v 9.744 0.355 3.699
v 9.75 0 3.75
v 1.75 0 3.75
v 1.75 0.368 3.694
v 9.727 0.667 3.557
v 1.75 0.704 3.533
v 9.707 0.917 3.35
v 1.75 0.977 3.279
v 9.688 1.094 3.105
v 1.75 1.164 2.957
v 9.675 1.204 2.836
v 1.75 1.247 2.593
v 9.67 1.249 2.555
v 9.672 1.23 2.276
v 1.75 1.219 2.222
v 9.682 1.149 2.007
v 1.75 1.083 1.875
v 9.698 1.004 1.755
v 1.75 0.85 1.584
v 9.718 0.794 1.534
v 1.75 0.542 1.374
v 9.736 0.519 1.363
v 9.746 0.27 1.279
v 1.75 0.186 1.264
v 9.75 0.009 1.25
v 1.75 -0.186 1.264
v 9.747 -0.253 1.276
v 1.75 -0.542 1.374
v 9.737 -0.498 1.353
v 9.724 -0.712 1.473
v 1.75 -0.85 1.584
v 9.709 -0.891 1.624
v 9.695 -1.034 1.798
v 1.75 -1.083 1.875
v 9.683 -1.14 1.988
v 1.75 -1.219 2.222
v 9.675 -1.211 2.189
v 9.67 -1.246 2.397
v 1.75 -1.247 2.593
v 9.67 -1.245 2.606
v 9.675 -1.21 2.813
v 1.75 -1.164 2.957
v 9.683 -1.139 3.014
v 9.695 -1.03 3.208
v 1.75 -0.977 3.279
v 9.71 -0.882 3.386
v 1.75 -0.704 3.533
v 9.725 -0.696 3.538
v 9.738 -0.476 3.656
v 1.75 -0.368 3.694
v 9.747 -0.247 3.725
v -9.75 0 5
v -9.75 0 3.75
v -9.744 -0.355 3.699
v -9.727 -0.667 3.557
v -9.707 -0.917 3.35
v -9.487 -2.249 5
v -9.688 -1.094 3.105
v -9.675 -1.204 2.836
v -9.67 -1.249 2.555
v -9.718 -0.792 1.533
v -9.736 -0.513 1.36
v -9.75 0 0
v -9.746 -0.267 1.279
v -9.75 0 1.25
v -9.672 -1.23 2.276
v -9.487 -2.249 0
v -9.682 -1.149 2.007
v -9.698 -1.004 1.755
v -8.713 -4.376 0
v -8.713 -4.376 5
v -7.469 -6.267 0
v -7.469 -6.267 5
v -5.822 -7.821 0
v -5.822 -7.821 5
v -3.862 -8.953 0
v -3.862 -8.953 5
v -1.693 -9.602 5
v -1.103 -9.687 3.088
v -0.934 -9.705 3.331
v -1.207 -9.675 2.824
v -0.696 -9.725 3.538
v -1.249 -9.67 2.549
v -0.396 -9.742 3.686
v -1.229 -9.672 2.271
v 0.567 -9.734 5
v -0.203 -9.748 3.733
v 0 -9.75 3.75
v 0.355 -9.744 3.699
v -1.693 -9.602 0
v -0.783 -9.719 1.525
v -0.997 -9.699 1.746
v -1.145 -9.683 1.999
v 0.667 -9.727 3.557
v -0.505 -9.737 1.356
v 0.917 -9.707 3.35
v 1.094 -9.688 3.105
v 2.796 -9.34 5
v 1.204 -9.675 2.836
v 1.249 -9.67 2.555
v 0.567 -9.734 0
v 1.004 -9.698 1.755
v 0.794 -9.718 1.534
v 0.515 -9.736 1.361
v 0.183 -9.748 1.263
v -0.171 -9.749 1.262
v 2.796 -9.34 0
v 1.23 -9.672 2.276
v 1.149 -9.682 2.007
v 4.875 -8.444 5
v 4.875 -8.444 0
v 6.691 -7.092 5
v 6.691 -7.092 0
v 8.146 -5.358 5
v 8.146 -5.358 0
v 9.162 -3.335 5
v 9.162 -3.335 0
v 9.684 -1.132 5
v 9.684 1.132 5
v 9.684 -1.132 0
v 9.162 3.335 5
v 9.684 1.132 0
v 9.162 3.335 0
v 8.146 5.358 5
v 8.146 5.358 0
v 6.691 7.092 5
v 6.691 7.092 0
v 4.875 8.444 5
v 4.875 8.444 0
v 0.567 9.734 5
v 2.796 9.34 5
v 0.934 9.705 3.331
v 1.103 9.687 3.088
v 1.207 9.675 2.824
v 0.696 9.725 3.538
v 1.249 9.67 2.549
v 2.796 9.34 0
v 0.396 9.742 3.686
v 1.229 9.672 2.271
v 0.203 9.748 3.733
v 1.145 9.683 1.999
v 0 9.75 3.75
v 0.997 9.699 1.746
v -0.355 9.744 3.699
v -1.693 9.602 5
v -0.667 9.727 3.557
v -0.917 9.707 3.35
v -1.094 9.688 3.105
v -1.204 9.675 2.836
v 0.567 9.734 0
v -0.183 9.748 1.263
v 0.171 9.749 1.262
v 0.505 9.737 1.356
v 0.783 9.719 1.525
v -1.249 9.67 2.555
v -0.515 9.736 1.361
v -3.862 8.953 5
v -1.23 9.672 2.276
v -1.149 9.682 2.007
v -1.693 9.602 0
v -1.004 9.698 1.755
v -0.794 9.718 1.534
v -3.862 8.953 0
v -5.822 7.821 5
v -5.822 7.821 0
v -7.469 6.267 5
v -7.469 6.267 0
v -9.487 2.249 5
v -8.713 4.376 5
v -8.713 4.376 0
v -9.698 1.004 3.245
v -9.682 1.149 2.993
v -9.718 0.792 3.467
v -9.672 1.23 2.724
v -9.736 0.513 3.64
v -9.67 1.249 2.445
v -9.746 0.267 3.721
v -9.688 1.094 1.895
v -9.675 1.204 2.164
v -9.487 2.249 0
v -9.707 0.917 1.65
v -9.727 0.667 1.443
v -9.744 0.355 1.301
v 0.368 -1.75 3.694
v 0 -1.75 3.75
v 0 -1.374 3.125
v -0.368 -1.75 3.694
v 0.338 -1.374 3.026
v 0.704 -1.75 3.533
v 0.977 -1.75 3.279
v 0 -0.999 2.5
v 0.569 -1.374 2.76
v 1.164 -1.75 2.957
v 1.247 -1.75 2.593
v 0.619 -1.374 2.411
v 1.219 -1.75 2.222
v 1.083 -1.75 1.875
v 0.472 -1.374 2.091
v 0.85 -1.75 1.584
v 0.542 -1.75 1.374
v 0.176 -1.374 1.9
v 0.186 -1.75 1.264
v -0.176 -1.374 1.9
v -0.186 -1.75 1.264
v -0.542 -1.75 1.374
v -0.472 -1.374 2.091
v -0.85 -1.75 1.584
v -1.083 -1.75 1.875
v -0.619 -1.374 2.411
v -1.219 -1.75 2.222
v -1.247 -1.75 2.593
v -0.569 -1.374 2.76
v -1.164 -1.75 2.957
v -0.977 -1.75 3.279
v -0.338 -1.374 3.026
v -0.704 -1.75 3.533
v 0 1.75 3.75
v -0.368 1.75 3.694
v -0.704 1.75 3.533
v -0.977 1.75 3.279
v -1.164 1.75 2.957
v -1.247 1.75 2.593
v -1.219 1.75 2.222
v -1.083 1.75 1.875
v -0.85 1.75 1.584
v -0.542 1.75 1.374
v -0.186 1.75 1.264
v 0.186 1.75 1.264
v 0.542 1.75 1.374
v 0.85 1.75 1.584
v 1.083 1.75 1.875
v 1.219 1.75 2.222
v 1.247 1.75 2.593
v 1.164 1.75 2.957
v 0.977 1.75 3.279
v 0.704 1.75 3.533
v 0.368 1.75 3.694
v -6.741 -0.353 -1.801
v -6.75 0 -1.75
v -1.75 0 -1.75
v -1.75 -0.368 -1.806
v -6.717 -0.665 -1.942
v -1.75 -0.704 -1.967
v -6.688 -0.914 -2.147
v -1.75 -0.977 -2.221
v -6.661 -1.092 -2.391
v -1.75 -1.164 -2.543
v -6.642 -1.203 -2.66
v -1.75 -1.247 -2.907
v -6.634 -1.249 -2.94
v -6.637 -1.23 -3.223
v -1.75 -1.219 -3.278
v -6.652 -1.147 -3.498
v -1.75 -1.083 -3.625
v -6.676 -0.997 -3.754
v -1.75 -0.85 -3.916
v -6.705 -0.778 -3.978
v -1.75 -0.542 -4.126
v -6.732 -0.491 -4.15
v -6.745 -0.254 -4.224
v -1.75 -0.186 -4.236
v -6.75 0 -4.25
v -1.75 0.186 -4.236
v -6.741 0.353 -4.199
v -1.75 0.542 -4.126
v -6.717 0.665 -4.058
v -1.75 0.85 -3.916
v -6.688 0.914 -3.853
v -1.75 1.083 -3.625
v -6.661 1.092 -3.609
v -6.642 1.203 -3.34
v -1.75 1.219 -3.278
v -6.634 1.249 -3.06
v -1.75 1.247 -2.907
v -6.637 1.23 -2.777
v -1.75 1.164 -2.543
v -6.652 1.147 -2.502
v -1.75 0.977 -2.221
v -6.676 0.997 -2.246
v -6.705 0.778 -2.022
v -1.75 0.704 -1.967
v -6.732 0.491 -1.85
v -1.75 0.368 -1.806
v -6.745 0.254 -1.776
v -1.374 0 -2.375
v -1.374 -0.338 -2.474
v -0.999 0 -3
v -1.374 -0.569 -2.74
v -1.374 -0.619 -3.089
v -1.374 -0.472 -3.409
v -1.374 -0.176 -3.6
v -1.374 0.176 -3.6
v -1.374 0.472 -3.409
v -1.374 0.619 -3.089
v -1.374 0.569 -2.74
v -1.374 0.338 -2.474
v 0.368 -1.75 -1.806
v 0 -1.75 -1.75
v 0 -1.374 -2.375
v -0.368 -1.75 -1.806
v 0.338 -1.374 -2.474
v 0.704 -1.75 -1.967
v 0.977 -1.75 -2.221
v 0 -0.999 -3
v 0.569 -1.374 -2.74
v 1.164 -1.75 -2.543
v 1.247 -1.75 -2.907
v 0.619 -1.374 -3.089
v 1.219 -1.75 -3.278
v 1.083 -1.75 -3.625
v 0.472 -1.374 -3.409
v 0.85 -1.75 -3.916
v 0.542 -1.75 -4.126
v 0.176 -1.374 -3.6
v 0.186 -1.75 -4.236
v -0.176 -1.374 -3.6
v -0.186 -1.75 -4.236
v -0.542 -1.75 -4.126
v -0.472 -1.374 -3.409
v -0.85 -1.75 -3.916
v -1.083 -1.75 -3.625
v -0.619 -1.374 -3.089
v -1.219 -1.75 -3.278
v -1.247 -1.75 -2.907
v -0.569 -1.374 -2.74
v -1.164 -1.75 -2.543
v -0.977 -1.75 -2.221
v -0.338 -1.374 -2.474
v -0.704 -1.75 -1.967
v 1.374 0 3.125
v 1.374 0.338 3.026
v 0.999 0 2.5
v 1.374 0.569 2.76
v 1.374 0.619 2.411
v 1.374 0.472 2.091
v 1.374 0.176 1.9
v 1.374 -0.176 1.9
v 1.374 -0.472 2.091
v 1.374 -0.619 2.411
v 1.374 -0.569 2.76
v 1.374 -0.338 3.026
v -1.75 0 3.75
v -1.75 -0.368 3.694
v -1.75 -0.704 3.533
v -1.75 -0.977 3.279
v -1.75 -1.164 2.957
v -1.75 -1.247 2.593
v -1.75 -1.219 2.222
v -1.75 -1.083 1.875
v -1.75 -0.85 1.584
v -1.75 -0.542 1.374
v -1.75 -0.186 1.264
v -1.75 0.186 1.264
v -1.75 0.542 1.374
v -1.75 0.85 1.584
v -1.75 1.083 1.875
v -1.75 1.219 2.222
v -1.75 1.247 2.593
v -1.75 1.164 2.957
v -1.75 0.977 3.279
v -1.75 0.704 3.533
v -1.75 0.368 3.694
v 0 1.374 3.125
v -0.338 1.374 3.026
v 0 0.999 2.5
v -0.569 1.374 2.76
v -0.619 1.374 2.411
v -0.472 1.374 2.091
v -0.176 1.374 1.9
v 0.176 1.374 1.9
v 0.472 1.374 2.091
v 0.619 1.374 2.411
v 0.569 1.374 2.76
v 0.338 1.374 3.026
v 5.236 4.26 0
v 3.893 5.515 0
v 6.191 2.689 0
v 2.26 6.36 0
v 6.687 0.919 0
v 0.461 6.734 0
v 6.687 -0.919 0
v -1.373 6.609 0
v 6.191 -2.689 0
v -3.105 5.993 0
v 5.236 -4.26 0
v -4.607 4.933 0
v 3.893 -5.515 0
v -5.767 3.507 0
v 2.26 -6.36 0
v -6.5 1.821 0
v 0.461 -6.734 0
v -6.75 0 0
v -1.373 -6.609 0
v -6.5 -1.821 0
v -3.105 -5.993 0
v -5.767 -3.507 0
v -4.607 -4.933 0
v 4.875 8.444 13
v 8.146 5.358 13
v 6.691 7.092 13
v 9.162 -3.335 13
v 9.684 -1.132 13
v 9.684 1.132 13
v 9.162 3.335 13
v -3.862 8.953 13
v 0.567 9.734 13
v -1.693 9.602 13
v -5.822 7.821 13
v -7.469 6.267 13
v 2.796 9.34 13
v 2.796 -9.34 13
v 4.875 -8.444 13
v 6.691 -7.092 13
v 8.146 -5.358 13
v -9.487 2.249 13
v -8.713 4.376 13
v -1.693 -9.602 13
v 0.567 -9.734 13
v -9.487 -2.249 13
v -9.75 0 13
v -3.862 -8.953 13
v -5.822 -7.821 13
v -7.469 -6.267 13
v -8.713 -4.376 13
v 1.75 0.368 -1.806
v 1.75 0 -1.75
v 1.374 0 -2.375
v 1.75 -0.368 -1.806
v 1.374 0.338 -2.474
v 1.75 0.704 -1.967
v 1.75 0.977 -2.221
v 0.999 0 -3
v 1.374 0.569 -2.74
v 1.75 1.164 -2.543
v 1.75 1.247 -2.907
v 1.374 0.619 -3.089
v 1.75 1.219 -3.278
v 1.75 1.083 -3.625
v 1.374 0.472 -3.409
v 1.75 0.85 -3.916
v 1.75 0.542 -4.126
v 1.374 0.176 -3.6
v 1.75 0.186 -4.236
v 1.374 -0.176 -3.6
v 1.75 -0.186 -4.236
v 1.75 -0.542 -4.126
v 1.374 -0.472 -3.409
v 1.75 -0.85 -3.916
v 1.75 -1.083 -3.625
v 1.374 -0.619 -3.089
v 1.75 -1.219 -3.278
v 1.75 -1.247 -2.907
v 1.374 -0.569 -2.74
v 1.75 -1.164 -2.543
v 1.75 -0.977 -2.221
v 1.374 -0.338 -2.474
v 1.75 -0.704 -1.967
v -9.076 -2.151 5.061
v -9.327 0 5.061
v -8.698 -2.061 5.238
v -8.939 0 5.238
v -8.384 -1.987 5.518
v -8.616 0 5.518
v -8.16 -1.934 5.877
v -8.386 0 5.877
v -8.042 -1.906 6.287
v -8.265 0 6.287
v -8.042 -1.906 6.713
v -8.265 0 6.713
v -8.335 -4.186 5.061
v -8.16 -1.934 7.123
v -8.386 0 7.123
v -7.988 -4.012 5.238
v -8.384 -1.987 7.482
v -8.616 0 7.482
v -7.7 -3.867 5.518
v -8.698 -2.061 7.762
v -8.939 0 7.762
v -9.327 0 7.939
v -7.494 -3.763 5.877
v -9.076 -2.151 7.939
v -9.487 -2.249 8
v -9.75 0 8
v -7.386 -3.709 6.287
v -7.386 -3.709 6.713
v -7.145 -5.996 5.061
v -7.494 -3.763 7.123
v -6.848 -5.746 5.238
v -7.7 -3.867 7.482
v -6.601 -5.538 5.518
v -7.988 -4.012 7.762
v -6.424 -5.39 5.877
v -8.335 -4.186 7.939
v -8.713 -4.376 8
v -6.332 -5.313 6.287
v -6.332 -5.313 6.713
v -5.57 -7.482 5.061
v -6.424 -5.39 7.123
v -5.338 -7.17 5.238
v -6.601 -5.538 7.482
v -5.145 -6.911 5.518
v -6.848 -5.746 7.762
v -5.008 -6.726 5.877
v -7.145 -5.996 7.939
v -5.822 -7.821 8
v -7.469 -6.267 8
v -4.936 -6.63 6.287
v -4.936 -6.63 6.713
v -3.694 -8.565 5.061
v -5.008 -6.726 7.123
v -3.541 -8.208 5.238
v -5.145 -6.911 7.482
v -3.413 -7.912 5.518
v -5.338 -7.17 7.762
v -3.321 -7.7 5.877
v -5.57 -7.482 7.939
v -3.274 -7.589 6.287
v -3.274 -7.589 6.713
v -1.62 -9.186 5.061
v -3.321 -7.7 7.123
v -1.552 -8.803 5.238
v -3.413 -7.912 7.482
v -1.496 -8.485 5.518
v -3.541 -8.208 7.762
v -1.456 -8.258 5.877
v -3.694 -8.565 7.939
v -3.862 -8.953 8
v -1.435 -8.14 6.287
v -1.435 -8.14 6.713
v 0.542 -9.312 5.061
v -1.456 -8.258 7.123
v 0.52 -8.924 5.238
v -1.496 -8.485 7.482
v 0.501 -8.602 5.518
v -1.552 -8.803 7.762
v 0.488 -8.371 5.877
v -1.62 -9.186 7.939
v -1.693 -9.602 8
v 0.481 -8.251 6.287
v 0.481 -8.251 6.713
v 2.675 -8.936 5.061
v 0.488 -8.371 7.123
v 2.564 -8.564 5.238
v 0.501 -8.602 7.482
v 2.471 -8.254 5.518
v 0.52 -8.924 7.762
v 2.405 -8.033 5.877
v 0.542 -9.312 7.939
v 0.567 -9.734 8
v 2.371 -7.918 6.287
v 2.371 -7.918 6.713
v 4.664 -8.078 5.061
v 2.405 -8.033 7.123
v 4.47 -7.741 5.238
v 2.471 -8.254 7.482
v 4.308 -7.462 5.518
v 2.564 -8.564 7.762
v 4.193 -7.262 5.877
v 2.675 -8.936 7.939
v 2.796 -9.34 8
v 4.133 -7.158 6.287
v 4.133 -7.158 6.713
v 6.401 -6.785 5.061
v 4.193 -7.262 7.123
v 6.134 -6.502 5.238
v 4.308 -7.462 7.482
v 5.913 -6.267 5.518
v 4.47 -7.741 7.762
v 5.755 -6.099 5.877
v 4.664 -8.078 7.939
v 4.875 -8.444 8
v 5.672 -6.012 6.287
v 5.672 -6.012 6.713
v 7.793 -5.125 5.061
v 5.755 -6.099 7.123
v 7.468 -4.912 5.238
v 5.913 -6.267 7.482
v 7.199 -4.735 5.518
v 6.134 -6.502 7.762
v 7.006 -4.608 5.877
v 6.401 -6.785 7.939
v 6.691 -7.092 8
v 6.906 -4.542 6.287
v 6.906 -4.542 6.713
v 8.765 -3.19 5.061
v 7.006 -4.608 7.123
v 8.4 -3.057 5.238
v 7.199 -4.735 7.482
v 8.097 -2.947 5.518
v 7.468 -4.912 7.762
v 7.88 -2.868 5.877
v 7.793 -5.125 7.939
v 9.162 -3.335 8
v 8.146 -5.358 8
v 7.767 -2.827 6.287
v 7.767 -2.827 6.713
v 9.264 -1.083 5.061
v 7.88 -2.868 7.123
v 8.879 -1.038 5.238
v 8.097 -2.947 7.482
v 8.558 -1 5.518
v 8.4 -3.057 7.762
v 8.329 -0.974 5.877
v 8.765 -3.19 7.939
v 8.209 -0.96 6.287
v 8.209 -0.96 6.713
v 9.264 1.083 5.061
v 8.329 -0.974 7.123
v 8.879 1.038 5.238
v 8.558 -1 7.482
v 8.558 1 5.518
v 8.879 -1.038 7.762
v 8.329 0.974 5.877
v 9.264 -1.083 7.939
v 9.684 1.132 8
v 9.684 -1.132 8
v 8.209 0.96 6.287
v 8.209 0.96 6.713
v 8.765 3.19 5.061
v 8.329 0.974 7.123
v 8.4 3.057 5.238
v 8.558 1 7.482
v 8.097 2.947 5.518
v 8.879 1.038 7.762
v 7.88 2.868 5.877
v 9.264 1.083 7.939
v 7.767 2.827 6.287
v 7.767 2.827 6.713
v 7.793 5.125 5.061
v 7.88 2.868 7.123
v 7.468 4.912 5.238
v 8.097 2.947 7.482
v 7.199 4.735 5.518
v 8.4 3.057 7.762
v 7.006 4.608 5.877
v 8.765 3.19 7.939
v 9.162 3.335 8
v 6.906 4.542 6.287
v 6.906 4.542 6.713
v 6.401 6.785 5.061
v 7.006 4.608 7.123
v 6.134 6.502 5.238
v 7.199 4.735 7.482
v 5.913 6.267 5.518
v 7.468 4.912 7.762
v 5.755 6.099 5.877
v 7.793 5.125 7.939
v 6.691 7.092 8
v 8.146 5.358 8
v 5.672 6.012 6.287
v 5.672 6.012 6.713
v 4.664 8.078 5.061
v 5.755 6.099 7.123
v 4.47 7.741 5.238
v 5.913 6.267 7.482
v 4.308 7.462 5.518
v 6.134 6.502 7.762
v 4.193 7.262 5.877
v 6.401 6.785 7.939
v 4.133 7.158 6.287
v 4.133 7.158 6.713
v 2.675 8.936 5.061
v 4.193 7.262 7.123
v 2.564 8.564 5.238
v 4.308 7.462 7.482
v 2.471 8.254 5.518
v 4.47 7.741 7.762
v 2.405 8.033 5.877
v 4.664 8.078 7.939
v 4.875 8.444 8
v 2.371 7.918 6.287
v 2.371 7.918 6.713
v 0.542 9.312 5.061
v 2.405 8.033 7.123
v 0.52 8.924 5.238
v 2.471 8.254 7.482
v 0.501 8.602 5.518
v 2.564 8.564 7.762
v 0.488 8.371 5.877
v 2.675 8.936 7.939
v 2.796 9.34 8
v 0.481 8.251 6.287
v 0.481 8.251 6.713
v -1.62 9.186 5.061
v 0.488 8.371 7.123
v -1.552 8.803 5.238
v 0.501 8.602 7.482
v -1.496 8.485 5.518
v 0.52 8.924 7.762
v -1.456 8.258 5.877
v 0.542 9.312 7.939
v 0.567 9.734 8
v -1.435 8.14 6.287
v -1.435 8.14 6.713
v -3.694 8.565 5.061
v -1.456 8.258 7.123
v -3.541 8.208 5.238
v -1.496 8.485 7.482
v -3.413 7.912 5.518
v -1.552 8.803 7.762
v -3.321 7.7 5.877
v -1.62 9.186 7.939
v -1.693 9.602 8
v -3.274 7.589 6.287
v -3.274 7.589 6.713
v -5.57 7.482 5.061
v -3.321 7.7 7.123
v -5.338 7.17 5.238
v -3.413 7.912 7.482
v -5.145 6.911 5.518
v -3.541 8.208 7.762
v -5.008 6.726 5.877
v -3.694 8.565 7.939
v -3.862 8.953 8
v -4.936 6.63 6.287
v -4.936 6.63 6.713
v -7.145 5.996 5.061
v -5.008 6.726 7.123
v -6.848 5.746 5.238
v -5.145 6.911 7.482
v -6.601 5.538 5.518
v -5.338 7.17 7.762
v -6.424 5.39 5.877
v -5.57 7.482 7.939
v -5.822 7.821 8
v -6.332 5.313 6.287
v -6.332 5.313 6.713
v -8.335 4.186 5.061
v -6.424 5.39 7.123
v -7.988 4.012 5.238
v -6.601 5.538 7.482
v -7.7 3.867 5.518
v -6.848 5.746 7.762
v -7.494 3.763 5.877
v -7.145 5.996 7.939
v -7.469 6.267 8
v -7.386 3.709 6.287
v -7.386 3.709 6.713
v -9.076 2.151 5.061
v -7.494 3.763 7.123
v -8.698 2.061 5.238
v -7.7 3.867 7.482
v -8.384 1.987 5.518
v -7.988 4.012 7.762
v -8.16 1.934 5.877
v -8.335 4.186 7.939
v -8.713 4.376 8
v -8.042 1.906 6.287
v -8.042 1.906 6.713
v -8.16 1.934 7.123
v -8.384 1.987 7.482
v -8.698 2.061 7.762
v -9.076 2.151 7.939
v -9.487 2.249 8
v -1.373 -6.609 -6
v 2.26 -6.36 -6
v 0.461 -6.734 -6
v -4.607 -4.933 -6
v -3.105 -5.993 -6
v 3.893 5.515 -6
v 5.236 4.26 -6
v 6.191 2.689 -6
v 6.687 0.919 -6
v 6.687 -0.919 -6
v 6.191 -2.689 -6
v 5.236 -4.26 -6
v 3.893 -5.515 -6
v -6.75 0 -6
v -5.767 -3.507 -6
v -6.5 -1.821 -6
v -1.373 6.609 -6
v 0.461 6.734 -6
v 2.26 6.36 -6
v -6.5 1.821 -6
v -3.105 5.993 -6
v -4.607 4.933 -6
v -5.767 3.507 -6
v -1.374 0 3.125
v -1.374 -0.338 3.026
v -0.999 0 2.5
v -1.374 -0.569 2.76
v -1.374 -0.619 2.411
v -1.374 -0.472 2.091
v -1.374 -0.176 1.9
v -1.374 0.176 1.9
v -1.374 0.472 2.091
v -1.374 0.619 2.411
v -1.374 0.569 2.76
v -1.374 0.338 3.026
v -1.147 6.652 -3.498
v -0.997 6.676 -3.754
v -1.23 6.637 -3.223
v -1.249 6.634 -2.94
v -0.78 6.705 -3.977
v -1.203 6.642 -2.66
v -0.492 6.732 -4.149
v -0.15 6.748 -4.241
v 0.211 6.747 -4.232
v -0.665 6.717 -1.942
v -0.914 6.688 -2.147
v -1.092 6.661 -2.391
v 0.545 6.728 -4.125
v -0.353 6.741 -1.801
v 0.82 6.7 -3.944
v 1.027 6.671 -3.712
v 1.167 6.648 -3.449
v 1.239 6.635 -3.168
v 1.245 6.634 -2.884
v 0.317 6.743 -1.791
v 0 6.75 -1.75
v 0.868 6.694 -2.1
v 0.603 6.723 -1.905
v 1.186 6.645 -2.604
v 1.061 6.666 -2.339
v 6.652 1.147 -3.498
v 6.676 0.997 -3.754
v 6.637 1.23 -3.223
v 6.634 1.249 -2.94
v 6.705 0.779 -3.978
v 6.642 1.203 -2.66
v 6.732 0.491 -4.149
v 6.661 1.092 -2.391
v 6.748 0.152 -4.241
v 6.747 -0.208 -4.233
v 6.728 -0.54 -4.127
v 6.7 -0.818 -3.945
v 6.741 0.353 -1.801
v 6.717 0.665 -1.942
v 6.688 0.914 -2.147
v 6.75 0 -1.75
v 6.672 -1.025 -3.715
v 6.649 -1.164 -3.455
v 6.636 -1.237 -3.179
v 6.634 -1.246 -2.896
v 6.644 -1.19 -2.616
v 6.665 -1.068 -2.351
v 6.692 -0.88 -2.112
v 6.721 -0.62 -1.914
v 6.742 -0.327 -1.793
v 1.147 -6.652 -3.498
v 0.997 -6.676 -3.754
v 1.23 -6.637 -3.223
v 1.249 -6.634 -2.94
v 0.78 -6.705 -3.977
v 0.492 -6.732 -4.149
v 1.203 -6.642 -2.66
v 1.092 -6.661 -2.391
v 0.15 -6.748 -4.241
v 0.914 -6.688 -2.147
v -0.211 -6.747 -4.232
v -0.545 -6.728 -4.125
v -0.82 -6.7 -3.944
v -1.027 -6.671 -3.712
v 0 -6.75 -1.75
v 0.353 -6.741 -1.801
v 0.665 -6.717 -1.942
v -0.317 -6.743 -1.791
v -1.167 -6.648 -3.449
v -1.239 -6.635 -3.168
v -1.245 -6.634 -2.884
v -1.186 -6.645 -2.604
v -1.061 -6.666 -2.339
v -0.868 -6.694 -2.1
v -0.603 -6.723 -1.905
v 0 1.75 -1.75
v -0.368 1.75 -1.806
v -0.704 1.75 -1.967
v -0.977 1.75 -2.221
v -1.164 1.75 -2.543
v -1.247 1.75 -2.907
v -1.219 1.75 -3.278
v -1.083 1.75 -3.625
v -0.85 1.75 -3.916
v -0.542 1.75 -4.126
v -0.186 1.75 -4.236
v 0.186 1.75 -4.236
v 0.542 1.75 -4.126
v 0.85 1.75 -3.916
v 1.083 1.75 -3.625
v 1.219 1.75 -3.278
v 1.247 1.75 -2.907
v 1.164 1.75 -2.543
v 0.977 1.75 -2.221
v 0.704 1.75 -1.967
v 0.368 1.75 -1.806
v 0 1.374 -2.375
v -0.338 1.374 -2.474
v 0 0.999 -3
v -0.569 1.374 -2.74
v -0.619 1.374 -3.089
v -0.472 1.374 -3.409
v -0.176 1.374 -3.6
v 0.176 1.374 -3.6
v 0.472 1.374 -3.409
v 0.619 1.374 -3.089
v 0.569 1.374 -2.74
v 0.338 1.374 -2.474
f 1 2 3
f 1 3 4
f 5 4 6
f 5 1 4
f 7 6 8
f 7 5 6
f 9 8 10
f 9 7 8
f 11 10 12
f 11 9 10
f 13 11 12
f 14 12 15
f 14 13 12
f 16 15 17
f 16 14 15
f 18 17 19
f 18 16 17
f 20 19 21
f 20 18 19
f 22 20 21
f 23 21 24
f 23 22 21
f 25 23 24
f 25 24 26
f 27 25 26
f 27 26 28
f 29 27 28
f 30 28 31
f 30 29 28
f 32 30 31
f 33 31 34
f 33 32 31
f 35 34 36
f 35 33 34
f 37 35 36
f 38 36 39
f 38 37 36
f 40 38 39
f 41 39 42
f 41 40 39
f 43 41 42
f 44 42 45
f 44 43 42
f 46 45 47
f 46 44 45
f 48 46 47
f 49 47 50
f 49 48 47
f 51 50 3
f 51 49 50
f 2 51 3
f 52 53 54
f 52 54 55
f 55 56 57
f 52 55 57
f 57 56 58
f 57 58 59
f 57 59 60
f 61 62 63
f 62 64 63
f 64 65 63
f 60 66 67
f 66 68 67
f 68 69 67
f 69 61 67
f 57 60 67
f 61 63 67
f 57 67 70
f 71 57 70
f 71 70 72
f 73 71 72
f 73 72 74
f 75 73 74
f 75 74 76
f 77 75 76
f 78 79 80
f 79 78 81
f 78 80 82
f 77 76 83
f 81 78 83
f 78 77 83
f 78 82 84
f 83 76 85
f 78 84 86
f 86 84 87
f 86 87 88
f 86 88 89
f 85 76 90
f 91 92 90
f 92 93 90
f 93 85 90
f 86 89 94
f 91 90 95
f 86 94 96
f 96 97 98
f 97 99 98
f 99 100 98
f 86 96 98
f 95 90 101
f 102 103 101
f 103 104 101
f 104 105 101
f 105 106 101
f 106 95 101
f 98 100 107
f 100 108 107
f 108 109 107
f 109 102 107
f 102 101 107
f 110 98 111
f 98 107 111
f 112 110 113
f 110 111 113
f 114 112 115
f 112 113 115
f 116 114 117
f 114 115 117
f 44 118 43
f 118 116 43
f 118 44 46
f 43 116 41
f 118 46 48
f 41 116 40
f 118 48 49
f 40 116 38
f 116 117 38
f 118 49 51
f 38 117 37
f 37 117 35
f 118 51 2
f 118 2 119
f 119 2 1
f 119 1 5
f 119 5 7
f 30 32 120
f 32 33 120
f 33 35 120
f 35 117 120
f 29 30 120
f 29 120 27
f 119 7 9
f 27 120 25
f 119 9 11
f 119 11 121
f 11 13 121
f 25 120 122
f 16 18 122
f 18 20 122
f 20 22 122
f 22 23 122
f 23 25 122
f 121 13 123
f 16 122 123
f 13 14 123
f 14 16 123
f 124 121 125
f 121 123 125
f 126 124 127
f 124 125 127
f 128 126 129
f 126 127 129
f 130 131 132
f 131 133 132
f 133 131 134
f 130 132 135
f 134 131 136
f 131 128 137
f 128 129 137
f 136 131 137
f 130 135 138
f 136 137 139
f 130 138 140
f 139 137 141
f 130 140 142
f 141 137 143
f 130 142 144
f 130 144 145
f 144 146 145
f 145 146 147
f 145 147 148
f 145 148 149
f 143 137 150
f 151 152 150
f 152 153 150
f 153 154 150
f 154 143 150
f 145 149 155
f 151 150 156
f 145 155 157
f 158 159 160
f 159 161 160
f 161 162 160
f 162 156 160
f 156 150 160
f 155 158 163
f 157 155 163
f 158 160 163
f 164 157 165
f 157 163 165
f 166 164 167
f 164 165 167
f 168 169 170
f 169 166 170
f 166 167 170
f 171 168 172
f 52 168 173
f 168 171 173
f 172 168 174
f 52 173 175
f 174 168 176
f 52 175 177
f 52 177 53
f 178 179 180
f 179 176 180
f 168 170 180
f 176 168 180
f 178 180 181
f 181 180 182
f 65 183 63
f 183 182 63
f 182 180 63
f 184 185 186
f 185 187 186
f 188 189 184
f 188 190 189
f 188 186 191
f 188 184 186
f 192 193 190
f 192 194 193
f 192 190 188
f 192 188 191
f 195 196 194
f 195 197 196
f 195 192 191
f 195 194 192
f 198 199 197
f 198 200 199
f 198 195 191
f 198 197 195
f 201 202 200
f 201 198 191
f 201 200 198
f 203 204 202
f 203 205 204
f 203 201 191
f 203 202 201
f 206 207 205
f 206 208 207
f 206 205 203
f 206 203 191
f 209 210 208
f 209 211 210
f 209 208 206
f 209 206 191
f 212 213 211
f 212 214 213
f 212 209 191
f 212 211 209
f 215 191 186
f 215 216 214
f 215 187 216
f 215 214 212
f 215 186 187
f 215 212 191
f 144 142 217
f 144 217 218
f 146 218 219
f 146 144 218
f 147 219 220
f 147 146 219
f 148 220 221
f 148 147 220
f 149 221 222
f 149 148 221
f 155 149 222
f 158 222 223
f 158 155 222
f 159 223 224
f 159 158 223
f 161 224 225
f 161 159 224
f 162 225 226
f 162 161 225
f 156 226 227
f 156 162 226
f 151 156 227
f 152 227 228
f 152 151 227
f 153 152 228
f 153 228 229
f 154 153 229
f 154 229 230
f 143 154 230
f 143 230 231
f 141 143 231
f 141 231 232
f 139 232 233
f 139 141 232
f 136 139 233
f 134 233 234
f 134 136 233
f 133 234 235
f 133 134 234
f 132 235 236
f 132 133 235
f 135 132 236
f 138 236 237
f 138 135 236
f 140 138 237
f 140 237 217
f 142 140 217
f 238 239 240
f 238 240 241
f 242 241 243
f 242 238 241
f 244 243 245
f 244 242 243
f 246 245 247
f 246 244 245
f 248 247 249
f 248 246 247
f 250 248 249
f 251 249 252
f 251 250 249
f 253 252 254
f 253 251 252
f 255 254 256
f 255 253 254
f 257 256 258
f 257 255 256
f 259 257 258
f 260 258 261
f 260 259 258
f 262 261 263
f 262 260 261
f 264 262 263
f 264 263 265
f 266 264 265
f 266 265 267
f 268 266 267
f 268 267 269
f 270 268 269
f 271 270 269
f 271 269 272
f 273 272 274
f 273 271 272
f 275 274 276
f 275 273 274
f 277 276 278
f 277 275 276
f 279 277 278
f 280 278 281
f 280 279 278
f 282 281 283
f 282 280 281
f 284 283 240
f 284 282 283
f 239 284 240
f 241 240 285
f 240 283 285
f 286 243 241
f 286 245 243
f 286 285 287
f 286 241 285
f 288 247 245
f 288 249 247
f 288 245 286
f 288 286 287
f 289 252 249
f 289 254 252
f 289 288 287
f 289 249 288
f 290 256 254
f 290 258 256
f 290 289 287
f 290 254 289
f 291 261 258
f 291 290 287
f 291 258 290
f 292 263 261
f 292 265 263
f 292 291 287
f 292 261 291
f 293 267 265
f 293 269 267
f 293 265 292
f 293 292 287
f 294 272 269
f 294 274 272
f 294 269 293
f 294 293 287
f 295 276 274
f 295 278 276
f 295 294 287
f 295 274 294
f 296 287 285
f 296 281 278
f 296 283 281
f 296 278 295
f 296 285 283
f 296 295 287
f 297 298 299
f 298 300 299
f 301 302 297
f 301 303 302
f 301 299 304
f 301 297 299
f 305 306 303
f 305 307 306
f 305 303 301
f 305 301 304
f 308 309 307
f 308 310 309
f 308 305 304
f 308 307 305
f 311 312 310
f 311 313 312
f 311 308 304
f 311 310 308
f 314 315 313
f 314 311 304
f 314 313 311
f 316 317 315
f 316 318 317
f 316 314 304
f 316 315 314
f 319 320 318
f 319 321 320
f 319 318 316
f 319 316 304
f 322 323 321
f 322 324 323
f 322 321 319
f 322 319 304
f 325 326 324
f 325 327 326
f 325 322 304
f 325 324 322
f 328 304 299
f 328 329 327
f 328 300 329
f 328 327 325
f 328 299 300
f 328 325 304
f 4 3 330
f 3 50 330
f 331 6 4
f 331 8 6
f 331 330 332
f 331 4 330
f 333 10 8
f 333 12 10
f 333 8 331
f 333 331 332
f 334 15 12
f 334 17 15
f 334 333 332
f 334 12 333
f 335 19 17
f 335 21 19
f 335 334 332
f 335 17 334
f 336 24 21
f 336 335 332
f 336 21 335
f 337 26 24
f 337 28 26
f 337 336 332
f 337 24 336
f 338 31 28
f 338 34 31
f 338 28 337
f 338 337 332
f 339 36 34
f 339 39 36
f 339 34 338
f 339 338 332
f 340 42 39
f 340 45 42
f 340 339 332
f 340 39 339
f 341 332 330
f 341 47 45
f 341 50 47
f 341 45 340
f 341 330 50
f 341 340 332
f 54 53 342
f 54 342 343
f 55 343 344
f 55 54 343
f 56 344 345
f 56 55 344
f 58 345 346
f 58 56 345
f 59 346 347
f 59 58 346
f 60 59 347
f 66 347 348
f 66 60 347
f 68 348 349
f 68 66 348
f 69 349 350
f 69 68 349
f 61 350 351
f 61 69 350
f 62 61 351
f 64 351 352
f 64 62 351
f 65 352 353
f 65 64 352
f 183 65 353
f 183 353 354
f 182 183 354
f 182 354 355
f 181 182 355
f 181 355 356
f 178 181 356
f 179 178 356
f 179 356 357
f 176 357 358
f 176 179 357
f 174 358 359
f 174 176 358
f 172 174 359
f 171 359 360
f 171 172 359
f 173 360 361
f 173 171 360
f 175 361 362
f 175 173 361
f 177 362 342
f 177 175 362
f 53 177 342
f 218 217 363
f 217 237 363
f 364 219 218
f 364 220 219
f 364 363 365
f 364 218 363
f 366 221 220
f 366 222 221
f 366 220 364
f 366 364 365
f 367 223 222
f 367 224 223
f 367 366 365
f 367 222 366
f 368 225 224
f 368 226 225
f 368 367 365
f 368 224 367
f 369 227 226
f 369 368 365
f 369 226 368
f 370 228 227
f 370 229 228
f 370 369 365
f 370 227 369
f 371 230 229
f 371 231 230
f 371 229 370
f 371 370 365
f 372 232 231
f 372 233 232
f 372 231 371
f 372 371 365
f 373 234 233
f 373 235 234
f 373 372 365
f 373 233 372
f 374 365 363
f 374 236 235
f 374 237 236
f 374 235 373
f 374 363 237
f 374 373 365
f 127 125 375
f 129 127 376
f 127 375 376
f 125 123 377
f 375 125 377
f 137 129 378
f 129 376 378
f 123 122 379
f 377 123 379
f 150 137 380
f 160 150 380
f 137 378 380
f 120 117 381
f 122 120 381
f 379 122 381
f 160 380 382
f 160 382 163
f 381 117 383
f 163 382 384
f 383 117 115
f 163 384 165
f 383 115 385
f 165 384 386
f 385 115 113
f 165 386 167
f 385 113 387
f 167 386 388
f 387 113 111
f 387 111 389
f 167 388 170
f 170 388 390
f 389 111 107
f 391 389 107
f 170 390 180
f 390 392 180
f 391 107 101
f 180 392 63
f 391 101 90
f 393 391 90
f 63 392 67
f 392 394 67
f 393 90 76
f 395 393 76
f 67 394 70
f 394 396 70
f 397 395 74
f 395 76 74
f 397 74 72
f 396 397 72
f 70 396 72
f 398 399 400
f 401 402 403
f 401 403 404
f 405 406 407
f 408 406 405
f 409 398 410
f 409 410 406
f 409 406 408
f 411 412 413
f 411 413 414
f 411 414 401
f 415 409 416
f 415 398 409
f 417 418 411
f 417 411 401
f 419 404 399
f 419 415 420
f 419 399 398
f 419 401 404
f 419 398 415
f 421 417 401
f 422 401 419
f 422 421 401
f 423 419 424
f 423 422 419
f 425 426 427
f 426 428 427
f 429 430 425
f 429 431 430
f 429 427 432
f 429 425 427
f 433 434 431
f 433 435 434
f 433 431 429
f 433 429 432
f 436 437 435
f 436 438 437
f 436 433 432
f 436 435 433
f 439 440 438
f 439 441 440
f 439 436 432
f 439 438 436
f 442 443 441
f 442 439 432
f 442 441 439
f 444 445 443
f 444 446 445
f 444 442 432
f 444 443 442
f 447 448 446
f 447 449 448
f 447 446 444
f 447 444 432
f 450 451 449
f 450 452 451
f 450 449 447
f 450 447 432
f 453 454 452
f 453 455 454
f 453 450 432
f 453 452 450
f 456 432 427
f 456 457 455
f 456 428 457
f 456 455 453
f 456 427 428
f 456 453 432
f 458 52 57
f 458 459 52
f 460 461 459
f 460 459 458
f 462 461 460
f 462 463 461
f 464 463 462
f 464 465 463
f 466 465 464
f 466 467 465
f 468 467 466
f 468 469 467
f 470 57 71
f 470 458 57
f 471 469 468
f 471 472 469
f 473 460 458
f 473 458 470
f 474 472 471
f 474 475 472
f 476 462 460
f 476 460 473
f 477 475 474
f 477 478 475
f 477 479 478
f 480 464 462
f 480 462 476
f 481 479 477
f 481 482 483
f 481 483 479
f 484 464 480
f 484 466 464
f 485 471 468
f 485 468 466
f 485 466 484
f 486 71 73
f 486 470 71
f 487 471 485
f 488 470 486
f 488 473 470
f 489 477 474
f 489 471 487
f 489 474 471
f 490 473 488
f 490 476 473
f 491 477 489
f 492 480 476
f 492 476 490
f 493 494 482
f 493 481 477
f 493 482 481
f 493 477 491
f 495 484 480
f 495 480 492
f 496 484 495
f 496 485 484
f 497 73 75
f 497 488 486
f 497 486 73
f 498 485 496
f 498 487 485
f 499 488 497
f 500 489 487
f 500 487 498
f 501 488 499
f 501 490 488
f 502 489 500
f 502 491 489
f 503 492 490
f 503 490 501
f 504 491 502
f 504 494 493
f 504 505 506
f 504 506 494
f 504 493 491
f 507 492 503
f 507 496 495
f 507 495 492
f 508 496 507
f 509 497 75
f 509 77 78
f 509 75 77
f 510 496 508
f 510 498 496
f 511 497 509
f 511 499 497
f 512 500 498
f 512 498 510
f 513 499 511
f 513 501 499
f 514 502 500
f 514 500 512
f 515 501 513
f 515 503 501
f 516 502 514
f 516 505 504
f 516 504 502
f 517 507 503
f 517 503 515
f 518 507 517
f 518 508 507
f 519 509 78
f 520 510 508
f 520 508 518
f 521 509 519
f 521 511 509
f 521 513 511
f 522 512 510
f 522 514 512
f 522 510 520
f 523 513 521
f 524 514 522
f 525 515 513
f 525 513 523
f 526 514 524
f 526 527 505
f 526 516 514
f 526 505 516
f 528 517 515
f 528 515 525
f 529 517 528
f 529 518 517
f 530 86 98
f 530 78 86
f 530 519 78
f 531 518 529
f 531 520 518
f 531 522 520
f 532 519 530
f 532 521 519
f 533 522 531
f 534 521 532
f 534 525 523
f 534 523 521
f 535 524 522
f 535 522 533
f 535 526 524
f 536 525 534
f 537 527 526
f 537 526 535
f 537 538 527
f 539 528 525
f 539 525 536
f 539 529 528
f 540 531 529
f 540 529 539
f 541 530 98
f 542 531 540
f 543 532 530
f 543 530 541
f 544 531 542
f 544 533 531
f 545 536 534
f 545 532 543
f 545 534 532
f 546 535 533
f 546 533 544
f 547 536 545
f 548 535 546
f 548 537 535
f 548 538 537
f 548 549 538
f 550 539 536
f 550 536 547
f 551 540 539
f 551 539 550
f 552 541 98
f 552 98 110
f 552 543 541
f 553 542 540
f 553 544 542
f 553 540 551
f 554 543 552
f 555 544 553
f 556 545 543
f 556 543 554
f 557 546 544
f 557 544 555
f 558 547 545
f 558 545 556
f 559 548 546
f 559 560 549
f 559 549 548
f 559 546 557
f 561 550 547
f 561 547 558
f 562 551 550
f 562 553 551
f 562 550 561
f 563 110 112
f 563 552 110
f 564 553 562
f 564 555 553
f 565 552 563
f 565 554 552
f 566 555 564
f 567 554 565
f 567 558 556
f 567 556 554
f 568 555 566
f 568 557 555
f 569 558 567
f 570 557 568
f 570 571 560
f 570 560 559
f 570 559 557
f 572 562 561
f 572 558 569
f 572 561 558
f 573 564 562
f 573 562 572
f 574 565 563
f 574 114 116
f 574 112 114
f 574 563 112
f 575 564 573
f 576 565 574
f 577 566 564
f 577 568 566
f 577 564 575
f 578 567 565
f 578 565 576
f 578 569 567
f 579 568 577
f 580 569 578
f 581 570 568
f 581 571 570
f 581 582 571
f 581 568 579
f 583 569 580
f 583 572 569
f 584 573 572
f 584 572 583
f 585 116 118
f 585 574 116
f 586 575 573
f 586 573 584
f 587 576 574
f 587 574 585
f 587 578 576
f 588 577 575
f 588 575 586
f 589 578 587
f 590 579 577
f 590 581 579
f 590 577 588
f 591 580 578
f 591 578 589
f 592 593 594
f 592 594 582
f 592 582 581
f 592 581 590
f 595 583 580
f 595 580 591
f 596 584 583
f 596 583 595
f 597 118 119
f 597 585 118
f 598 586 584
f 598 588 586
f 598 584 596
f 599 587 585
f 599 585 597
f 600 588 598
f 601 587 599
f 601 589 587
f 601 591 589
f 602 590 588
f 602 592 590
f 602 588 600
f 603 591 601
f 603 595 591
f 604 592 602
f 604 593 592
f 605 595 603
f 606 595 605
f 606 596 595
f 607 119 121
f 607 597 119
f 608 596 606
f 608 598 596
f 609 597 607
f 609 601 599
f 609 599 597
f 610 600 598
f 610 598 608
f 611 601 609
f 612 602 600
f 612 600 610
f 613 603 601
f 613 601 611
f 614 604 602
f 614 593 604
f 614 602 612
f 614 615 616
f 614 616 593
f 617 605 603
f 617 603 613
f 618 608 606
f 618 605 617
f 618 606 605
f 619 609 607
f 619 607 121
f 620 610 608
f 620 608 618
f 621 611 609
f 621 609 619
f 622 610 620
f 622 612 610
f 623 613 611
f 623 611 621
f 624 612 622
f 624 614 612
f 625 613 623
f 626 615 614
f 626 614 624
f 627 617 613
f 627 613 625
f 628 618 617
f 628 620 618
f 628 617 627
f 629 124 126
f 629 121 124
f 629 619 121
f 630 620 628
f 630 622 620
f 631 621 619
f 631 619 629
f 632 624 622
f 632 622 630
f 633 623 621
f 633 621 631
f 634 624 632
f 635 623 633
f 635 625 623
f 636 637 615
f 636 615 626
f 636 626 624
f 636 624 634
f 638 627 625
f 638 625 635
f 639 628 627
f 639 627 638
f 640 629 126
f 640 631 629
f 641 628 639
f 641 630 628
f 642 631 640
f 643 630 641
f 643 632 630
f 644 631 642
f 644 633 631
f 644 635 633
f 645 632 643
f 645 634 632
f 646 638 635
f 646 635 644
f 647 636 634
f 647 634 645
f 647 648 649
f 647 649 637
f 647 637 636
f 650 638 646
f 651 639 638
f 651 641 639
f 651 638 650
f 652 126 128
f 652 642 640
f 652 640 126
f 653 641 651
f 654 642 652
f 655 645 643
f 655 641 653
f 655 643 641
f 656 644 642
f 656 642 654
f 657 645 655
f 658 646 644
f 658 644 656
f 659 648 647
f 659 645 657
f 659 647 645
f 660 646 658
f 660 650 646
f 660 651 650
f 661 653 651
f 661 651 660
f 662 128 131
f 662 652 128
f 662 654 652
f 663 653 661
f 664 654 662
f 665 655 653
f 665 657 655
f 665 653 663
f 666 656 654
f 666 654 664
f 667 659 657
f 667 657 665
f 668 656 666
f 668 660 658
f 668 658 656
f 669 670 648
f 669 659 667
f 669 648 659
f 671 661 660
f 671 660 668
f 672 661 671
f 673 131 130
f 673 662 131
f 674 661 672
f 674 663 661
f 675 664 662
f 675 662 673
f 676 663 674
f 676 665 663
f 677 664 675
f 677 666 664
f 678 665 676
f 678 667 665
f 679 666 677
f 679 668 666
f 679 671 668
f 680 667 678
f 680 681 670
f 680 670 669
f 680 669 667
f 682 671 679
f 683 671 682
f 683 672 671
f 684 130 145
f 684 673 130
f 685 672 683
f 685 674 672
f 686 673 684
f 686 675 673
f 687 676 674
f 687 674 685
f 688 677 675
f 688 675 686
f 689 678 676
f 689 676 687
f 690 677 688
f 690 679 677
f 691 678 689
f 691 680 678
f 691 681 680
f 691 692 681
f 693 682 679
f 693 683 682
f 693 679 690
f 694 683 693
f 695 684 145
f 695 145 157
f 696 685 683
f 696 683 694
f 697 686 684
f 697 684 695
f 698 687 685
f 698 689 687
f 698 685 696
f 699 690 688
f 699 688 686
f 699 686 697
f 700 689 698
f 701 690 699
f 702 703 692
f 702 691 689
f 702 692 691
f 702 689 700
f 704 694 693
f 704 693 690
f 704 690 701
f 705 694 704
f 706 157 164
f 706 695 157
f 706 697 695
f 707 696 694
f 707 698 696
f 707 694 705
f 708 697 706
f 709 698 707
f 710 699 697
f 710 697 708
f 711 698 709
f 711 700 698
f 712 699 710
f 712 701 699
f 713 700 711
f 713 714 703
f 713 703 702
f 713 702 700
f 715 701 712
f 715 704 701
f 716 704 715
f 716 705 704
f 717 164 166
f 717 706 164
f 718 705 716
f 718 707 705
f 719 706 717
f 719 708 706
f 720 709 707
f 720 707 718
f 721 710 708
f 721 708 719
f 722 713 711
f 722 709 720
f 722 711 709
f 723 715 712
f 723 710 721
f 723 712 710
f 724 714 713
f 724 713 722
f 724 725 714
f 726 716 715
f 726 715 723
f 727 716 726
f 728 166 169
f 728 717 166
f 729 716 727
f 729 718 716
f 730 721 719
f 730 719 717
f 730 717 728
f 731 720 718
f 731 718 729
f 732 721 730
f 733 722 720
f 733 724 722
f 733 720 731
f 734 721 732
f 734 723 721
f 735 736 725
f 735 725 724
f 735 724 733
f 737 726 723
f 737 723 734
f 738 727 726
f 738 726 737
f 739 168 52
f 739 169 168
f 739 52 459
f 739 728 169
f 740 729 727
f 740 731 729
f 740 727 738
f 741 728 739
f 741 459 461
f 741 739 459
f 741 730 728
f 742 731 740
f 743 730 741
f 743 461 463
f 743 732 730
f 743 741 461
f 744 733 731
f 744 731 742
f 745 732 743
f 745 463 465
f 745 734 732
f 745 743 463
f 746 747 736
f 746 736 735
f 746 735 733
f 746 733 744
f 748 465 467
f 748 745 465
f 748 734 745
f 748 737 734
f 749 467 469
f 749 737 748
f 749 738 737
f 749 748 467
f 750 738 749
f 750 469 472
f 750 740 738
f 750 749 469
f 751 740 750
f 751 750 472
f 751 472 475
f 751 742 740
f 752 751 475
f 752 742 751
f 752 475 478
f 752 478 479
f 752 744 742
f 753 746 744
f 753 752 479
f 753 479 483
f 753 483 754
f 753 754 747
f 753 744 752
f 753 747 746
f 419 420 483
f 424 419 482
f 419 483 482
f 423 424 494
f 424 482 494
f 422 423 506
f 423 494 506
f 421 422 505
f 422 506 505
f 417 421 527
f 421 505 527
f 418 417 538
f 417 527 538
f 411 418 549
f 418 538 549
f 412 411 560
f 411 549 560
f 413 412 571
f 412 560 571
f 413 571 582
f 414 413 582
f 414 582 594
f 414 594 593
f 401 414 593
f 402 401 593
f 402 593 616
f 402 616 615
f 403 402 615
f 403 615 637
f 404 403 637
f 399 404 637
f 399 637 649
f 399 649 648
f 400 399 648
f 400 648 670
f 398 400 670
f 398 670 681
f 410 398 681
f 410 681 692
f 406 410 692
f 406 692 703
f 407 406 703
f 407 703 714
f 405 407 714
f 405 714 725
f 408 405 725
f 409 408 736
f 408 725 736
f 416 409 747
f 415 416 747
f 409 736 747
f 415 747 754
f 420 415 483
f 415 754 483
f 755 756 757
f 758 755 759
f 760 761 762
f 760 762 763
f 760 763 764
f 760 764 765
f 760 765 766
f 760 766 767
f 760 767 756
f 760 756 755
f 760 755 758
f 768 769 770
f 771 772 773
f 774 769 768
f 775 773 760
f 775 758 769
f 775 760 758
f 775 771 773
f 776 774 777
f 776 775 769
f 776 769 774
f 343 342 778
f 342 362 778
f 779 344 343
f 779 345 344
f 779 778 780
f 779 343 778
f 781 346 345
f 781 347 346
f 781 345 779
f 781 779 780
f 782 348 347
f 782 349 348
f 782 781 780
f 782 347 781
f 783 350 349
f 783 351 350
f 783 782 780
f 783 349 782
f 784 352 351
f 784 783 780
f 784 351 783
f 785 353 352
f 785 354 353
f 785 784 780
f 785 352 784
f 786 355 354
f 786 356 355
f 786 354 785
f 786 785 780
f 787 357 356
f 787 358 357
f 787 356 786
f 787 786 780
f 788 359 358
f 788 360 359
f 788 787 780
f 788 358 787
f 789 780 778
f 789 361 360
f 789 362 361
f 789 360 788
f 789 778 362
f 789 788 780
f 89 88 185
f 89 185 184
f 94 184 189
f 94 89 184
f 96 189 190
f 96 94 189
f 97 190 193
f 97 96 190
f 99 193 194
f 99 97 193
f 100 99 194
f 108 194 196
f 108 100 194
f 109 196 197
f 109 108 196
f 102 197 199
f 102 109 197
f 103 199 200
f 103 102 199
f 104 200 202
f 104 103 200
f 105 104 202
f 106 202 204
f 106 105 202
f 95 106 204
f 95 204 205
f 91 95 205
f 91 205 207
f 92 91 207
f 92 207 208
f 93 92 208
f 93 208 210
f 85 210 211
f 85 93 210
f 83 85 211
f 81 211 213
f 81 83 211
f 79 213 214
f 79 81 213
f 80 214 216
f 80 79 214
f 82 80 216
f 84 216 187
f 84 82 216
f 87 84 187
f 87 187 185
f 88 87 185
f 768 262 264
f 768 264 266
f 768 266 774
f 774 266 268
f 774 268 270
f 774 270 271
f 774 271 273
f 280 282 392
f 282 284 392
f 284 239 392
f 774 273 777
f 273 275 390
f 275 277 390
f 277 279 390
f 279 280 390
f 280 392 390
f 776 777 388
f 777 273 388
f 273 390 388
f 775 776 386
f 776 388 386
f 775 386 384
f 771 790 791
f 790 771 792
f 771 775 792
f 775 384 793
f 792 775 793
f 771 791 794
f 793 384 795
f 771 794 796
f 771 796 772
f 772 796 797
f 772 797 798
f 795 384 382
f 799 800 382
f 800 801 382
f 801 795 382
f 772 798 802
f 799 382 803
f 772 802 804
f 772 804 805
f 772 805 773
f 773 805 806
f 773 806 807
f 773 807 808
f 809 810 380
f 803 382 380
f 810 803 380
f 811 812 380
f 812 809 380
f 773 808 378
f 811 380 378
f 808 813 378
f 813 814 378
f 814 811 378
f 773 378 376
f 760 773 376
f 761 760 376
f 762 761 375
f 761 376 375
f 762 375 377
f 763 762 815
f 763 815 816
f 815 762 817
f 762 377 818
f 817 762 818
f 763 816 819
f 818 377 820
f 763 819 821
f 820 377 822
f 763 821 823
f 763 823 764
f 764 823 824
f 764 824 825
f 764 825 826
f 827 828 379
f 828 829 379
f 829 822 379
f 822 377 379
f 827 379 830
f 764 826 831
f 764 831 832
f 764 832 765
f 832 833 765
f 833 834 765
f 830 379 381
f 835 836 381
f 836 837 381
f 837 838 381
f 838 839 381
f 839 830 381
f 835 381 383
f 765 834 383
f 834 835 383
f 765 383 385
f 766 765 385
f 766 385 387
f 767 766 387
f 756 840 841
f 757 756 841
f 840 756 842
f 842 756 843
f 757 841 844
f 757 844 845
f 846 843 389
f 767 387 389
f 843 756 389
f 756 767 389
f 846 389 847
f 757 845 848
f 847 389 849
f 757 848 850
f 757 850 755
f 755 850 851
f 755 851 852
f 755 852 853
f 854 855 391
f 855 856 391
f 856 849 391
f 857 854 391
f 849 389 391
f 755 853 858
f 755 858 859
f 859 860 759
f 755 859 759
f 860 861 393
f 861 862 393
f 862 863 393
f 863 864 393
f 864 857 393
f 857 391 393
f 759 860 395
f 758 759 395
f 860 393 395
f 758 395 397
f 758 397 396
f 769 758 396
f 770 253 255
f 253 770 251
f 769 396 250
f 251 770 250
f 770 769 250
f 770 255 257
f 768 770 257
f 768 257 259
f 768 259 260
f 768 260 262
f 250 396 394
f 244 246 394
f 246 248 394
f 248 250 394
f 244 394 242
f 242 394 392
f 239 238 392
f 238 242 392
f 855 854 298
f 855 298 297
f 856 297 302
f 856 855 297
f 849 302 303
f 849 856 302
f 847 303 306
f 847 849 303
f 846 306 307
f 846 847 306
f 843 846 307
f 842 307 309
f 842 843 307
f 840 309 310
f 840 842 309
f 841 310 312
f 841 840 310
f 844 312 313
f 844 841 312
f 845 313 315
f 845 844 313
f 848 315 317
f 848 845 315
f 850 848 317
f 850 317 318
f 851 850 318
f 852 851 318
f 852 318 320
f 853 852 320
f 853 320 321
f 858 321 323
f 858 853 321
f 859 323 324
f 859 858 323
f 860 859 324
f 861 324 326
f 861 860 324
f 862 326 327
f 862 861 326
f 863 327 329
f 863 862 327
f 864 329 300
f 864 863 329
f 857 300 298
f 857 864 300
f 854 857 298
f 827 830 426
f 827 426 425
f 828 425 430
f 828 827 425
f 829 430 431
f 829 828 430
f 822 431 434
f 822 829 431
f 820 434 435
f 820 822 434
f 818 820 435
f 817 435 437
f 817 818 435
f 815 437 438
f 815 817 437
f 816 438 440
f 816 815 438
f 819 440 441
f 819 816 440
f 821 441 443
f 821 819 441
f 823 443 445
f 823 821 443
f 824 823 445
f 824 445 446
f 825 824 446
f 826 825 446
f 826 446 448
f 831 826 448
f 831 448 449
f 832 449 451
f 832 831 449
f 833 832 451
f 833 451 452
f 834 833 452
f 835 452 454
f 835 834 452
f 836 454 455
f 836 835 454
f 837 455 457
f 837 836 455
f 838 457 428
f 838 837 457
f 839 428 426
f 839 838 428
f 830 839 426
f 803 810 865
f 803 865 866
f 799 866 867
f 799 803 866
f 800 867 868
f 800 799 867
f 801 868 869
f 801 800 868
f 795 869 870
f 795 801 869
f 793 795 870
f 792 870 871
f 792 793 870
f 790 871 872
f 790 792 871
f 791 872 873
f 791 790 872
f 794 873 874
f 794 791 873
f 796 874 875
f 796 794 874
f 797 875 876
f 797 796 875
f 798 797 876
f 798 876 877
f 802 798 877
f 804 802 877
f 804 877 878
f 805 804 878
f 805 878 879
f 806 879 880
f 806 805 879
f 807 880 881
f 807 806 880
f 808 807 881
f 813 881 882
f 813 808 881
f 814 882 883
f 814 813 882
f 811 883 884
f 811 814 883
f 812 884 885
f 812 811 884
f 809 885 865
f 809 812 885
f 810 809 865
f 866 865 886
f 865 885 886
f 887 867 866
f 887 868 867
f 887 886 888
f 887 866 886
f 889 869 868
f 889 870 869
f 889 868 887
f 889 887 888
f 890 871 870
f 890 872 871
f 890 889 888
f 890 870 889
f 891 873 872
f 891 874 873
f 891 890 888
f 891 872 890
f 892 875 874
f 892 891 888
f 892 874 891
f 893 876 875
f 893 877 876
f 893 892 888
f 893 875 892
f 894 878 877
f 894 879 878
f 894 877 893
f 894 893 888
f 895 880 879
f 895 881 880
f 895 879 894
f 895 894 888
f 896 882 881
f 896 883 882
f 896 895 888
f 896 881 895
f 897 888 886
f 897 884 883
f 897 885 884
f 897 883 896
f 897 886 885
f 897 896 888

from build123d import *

# Parameters (mm, degrees)
ESBO_O2_R                = 9.75
RESSALTO_EXTRUS_O1_DEPTH = 13
ESBO_O3_R                = 1.5
ESBO_O4_R                = 6.75
RESSALTO_EXTRUS_O2_DEPTH = 6
PADR_OCIRCULAR1_COUNT    = 4
PADR_OCIRCULAR2_COUNT    = 4


with BuildPart() as part:
    # Esboço2 → Ressalto-extrusão1 (new body)
    with BuildSketch(Plane.XY):
        with Locations(Location((0, 0, 0), (0, 0, 180))):
            Circle(ESBO_O2_R)
    extrude(amount=RESSALTO_EXTRUS_O1_DEPTH)

    # Esboço3 → Corte-Revolução1 (revolve, cut)
    with BuildSketch(Plane(origin=(0, 0, 0), x_dir=(1, 0, 0), z_dir=(0, 1, 0)), mode=Mode.PRIVATE) as corte_revolu_o1_sk:
        with Locations((9.75, -6.5)):
            Circle(ESBO_O3_R)
    revolve(corte_revolu_o1_sk.sketch.rotate(Axis((0, 0, 0), (0, 0, 1)), 180), axis=Axis((0, 0, 0), (0, 0, 1)), mode=Mode.SUBTRACT)

    # Esboço4 → Ressalto-extrusão2 (add)
    with BuildSketch(Plane(origin=(0, 0, 0), x_dir=(-1, 0, 0), z_dir=(0, 0, -1))):
        Circle(ESBO_O4_R)
    extrude(amount=RESSALTO_EXTRUS_O2_DEPTH)

    # Esboço15 → Broca de rosquear para tarraxa de M36 (revolve, cut)
    with BuildSketch(Plane(origin=(0, 9.75, 2.5), x_dir=(0, 0, 1), z_dir=(1, 0, 0))):
        Polygon((0, 0), (0, 8.751075774), (1.25, 8), (1.25, 0), align=None)
    broca_de_rosquear_para_tarraxa_de_m36 = revolve(axis=Axis((0, 16.1, 2.5), (0, -1, 0)), mode=Mode.SUBTRACT)

    # PadrãoCircular1: Broca de rosquear para tarraxa de M36 ×4 about axis
    padr_ocircular1_axis = Axis((0, 0, 0), (0, 0, 1))
    for i in range(1, PADR_OCIRCULAR1_COUNT):
        add(broca_de_rosquear_para_tarraxa_de_m36.rotate(padr_ocircular1_axis, i * 360 / PADR_OCIRCULAR1_COUNT), mode=Mode.SUBTRACT)

    # Esboço19 → Broca de rosquear para tarraxa de M310 (revolve, cut)
    with BuildSketch(Plane(origin=(0, 6.75, -3), x_dir=(0, 0, 1), z_dir=(1, 0, 0))):
        Polygon((0, 0), (0, 5.751075774), (1.25, 5), (1.25, 0), align=None)
    broca_de_rosquear_para_tarraxa_de_m310 = revolve(axis=Axis((0, 13.1, -3), (0, -1, 0)), mode=Mode.SUBTRACT)

    # PadrãoCircular2: Broca de rosquear para tarraxa de M310 ×4 about axis
    padr_ocircular2_axis = Axis((0, 0, 0), (0, 0, 1))
    for i in range(1, PADR_OCIRCULAR2_COUNT):
        add(broca_de_rosquear_para_tarraxa_de_m310.rotate(padr_ocircular2_axis, i * 360 / PADR_OCIRCULAR2_COUNT), mode=Mode.SUBTRACT)


solid = part.part
